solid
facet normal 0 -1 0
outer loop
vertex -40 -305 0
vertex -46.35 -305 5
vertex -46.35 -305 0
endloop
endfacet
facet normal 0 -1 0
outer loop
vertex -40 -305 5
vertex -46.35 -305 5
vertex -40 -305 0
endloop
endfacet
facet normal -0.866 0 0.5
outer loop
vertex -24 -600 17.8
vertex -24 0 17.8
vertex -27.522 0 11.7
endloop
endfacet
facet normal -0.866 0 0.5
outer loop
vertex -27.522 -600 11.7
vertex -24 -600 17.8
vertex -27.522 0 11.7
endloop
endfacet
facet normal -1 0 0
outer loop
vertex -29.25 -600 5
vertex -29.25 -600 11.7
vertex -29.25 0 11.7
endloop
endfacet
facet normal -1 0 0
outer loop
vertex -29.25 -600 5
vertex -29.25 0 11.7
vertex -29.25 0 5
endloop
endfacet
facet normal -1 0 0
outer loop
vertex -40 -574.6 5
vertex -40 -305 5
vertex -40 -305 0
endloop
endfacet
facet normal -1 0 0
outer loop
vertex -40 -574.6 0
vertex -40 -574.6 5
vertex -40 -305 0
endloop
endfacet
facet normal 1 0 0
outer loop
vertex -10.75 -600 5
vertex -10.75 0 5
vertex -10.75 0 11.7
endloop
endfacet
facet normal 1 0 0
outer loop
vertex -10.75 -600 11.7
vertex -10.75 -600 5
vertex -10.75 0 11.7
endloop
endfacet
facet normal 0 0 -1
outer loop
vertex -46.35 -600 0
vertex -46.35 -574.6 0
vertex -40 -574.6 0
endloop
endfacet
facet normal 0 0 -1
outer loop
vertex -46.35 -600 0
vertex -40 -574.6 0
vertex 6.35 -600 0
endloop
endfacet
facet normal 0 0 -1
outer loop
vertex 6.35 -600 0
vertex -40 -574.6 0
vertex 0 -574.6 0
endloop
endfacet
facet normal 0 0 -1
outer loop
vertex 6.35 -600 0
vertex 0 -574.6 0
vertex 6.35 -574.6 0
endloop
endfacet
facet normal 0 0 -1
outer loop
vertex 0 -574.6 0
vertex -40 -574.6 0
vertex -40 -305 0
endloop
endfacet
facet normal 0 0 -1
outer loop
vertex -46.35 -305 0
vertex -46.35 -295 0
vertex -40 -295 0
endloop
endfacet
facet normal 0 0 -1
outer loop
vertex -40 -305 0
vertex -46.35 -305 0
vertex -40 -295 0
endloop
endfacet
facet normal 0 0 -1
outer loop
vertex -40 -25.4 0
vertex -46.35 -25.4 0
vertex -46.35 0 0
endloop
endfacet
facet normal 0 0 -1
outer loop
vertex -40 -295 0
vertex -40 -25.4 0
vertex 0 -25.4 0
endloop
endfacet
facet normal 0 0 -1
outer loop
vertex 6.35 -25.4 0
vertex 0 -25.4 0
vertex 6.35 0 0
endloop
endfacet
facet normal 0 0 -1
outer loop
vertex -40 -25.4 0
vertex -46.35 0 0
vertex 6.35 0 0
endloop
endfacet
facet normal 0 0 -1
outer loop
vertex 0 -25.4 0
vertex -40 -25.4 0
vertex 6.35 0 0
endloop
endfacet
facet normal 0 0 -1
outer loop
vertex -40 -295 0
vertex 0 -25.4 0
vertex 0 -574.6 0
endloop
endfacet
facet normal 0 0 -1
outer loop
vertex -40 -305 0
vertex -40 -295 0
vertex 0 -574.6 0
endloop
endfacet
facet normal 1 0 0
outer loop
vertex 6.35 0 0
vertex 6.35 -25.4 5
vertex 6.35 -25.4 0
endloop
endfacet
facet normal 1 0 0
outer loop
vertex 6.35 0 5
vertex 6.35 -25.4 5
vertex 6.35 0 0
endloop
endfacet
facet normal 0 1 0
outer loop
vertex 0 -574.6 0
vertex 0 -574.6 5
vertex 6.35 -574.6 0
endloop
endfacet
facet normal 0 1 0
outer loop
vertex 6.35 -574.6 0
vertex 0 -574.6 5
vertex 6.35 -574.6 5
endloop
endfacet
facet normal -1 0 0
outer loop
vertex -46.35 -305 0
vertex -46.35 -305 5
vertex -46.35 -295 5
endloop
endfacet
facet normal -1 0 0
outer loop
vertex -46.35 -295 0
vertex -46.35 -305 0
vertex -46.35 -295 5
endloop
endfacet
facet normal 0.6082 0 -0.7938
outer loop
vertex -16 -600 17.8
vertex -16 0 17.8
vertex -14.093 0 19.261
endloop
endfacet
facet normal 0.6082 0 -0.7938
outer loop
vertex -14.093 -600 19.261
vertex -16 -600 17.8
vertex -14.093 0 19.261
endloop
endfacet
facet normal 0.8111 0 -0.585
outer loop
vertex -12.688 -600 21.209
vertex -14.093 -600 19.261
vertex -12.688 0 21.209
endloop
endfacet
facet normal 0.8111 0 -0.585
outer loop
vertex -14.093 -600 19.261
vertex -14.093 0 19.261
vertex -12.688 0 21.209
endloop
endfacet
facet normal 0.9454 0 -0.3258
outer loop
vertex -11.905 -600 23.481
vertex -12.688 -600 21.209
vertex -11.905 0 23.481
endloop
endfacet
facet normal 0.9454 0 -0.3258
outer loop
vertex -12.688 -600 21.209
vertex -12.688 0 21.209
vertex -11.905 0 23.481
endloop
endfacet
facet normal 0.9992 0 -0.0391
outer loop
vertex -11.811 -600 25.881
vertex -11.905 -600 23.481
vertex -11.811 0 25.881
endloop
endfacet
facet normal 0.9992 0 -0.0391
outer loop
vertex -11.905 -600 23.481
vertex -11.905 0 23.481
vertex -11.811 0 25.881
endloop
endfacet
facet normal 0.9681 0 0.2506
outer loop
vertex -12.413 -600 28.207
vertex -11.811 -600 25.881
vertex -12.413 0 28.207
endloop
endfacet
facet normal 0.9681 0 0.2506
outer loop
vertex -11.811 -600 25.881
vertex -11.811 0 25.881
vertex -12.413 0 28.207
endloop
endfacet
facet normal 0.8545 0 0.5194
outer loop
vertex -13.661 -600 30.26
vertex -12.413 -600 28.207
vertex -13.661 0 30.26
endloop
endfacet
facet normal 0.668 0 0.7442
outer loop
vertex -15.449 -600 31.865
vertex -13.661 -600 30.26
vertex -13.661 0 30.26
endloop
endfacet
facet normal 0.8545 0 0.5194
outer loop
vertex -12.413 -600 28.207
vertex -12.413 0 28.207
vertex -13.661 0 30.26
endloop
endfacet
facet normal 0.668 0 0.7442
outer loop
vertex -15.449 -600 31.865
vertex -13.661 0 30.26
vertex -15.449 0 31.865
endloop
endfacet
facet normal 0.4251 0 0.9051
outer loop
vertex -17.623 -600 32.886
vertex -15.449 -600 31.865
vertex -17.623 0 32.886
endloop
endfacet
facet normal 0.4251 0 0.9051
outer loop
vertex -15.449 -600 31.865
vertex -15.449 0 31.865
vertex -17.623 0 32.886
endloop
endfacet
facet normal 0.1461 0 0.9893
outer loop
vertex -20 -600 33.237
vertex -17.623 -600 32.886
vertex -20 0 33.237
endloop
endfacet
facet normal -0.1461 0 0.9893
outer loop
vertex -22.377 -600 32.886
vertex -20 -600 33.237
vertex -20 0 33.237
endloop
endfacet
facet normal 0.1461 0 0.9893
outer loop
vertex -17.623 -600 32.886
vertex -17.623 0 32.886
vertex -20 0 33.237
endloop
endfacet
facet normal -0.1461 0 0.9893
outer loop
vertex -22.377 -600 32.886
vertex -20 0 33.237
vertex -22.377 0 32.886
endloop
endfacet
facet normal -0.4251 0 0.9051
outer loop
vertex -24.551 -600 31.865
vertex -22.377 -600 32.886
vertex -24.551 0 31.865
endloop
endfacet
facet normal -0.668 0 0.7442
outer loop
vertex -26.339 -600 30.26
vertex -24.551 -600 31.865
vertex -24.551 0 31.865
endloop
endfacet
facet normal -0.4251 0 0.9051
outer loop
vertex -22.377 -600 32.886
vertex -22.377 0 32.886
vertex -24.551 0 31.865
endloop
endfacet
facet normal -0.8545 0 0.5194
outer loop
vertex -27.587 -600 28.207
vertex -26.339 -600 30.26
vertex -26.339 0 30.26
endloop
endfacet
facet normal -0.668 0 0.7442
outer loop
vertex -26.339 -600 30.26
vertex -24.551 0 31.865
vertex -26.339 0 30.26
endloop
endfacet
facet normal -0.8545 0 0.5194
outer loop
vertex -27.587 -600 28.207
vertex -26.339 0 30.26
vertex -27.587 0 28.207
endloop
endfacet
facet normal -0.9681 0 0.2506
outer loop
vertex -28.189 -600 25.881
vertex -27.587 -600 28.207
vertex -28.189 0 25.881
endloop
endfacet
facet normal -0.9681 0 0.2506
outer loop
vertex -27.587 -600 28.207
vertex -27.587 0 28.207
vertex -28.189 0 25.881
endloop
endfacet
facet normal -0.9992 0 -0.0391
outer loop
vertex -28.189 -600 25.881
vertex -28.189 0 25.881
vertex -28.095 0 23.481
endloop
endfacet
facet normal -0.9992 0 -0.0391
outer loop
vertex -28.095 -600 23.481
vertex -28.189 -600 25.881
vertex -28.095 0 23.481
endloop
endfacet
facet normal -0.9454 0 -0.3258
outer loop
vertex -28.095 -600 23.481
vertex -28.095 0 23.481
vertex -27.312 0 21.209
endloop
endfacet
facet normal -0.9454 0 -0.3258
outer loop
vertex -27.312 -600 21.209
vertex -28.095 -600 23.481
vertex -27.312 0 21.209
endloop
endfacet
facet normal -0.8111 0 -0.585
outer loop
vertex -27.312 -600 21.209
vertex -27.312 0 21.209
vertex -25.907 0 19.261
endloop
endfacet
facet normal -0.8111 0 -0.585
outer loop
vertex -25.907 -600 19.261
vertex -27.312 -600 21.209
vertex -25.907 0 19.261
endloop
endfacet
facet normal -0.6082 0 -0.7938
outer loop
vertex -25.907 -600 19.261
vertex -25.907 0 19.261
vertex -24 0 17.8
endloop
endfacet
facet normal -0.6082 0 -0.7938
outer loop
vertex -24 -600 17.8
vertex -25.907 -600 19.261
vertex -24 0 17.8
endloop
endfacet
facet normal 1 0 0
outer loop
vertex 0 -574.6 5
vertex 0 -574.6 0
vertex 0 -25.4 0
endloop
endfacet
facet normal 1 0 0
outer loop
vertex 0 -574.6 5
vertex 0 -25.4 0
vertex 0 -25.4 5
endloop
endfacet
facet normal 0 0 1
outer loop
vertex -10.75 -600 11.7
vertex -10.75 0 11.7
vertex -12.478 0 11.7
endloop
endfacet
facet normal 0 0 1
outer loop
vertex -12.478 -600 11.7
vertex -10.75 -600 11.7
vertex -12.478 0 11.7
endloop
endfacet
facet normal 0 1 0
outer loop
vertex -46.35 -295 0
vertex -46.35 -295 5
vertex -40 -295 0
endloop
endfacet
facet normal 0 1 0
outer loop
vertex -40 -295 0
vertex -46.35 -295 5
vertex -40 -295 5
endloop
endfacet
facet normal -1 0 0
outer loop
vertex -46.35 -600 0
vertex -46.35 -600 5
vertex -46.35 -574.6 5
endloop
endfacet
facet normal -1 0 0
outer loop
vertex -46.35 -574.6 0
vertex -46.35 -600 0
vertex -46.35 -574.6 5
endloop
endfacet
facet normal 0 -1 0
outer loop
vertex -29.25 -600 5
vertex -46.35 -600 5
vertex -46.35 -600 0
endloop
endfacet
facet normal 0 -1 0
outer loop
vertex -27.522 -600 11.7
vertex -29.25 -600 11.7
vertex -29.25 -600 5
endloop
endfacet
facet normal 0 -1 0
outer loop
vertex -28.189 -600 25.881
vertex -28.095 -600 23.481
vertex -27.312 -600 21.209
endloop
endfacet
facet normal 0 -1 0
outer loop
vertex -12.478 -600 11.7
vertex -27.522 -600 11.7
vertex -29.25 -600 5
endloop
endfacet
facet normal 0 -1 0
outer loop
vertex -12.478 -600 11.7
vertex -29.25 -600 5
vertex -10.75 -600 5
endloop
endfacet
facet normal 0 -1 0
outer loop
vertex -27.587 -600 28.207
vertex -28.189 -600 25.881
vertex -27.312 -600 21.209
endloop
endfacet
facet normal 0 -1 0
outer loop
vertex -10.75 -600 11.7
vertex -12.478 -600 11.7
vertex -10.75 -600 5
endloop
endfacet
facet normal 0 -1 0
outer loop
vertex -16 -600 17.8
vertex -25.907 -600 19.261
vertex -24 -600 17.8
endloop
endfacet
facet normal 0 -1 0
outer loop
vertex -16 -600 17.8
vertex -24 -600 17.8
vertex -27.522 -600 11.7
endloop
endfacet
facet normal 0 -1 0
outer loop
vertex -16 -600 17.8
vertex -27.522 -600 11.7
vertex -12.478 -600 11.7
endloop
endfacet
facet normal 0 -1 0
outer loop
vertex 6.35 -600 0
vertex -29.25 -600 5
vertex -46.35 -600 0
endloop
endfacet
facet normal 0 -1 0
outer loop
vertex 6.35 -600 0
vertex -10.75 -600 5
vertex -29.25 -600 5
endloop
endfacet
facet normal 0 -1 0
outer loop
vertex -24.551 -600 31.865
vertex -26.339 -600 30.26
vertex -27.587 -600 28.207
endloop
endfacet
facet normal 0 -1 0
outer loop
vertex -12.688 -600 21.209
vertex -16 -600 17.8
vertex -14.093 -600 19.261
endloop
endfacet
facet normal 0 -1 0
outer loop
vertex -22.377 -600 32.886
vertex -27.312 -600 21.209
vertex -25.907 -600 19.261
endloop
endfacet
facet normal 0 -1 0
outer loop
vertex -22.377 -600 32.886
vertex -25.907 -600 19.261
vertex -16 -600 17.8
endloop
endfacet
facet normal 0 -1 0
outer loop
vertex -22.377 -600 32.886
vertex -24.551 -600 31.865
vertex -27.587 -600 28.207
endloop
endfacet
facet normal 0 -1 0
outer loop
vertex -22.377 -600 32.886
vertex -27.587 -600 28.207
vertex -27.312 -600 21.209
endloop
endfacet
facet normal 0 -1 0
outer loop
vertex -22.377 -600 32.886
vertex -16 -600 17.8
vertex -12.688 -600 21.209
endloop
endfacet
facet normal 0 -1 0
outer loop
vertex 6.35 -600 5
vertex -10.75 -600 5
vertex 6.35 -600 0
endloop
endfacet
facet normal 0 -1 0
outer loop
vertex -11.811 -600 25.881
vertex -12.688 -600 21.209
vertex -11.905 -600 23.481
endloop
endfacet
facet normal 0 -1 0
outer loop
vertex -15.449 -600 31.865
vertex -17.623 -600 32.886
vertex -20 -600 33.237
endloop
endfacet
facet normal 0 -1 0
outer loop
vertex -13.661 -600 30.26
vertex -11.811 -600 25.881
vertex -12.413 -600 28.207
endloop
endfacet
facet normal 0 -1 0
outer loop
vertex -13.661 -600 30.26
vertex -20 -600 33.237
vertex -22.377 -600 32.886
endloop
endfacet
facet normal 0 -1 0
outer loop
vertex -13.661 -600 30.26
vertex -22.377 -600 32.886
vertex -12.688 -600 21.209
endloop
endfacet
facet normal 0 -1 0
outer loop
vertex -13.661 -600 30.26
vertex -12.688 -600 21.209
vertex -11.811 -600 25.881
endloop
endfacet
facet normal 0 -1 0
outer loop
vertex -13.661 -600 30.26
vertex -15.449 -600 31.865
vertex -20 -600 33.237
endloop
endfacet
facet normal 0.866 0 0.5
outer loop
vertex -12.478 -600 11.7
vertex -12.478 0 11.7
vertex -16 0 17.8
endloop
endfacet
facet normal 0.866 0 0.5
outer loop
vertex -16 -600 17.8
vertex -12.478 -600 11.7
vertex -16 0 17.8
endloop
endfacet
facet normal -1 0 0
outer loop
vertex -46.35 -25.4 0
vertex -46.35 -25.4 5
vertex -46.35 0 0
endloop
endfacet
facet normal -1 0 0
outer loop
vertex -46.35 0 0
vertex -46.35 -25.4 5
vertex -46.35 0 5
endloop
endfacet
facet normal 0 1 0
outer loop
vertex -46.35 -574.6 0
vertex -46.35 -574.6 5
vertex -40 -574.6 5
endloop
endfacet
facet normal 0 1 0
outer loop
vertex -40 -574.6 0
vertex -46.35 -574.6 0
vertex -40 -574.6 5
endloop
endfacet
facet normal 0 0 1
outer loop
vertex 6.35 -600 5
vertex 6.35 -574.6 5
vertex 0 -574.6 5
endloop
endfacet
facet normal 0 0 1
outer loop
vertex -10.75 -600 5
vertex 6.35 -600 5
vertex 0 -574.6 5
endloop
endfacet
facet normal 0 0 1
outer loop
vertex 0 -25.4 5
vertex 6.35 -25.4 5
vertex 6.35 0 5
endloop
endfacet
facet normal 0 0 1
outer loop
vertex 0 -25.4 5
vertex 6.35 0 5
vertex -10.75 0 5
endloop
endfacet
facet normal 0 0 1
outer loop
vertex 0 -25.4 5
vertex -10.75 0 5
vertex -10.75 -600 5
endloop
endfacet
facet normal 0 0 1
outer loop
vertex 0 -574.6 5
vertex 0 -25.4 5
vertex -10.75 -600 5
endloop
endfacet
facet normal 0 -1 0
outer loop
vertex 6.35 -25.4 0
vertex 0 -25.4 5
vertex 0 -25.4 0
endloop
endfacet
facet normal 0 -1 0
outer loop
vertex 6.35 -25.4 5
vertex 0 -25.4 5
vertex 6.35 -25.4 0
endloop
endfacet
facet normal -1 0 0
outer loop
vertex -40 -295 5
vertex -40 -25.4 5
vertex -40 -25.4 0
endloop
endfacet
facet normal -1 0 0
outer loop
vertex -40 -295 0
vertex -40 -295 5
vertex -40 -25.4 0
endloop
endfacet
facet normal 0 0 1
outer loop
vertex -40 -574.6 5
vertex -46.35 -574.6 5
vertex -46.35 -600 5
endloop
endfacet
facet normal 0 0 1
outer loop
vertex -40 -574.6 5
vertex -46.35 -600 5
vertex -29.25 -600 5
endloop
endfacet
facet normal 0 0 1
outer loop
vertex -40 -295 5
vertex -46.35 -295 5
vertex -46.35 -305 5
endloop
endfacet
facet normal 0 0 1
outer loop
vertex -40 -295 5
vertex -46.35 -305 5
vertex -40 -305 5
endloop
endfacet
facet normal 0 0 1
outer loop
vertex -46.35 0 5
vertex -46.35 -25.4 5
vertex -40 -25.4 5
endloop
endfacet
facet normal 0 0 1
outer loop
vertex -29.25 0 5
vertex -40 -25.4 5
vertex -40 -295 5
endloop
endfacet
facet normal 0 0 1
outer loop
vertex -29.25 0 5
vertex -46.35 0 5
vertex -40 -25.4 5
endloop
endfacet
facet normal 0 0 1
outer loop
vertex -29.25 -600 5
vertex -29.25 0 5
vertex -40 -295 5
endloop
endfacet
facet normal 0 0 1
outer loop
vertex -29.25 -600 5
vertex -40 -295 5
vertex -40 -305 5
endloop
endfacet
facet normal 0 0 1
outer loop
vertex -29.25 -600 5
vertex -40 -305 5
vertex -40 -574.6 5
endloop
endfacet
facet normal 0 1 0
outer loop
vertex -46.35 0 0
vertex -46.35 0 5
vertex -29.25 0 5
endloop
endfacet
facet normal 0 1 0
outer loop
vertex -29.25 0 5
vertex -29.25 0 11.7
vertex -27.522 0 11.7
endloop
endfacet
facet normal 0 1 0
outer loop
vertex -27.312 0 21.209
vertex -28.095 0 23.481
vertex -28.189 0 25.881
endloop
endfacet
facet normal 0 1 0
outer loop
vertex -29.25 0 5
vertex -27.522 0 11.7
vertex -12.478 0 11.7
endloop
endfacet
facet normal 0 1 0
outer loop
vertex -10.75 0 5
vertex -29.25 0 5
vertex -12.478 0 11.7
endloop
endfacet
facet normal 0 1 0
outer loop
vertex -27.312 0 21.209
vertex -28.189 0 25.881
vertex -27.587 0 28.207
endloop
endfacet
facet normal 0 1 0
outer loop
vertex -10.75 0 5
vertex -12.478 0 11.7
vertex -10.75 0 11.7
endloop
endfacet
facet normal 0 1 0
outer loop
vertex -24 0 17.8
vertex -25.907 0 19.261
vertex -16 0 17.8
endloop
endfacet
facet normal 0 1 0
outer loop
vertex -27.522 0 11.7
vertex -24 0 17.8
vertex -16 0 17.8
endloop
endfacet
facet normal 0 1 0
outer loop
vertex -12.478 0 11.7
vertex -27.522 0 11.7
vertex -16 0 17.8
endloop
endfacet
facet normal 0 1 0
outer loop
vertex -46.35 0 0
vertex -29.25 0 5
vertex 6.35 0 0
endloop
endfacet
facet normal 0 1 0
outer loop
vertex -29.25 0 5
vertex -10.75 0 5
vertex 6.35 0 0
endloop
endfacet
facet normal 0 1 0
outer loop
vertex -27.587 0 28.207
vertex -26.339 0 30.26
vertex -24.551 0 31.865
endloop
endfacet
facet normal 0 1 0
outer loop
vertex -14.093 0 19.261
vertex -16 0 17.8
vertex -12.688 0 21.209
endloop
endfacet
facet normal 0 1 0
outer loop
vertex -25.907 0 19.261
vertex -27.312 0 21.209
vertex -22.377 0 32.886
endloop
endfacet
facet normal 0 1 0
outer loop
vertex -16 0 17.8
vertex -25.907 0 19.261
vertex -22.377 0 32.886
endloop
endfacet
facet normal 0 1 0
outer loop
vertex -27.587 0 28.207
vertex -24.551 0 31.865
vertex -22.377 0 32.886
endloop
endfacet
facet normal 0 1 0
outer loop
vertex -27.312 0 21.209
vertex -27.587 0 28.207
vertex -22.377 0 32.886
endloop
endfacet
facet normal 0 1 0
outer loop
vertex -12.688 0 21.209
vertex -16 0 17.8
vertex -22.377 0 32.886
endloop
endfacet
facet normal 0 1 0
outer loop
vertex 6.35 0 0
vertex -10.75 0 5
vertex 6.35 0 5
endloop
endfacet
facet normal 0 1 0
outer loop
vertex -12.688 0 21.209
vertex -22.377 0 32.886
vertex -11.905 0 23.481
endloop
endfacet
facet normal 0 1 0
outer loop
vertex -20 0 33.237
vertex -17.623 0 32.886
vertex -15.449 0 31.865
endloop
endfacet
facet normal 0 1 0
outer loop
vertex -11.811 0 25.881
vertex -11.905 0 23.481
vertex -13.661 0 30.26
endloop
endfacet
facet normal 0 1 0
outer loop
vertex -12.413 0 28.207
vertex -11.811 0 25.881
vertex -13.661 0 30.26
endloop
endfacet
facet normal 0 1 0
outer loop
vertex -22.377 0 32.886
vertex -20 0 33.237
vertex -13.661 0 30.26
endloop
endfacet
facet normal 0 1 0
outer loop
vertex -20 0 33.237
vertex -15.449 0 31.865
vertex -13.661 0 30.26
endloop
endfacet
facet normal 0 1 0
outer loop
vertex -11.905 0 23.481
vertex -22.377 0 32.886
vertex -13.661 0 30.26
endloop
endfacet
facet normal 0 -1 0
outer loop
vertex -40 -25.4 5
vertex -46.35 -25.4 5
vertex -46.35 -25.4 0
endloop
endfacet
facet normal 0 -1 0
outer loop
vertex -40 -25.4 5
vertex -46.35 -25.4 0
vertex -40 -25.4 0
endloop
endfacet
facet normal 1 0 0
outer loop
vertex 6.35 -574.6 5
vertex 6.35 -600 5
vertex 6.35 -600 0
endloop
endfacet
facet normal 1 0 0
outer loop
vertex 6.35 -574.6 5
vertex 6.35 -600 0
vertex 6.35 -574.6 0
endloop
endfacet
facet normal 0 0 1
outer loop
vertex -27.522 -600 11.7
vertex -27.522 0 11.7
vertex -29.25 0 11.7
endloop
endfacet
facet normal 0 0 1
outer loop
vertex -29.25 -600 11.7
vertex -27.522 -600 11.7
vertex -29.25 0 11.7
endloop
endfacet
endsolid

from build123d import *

# Parameters (mm, degrees)
F1_DEPTH = 600
F2_W     = 52.7
F2_H     = 25.4
F3_DEPTH = 5
F4_W     = 6.35
F4_H     = 10
F5_DEPTH = 5


with BuildPart() as f1:
    # F0 (on Front) → F1 (new body)
    with BuildSketch(Plane.XZ):
        with BuildLine():
            Line((-40, 0), (0, 0))
            Line((0, 0), (0, 5))
            Line((0, 5), (-10.75, 5))
            Line((-10.75, 5), (-10.75, 11.7))
            Line((-10.75, 11.7), (-12.478163, 11.7))
            Line((-12.478163, 11.7), (-16, 17.8))
            ThreePointArc((-16, 17.8), (-20, 33.236504), (-24, 17.8))
            Line((-24, 17.8), (-27.521837, 11.7))
            Line((-27.521837, 11.7), (-29.25, 11.7))
            Line((-29.25, 11.7), (-29.25, 5))
            Line((-29.25, 5), (-40, 5))
            Line((-40, 5), (-40, 0))
        make_face()
    extrude(amount=F1_DEPTH)

    # F2 (on face) → F3 (join, through all)
    with BuildSketch(Plane.XY.offset(5)):
        with Locations((-20, -587.3)):
            Rectangle(F2_W, F2_H)
        with Locations((-20, -12.7)):
            Rectangle(F2_W, F2_H)
    extrude(amount=-F3_DEPTH)

    # F4 (on face) → F5 (join, through all)
    with BuildSketch(Plane.XY.offset(5)):
        with Locations((-43.175, -300)):
            Rectangle(F4_W, F4_H)
    extrude(amount=-F5_DEPTH)


solid = f1.part
